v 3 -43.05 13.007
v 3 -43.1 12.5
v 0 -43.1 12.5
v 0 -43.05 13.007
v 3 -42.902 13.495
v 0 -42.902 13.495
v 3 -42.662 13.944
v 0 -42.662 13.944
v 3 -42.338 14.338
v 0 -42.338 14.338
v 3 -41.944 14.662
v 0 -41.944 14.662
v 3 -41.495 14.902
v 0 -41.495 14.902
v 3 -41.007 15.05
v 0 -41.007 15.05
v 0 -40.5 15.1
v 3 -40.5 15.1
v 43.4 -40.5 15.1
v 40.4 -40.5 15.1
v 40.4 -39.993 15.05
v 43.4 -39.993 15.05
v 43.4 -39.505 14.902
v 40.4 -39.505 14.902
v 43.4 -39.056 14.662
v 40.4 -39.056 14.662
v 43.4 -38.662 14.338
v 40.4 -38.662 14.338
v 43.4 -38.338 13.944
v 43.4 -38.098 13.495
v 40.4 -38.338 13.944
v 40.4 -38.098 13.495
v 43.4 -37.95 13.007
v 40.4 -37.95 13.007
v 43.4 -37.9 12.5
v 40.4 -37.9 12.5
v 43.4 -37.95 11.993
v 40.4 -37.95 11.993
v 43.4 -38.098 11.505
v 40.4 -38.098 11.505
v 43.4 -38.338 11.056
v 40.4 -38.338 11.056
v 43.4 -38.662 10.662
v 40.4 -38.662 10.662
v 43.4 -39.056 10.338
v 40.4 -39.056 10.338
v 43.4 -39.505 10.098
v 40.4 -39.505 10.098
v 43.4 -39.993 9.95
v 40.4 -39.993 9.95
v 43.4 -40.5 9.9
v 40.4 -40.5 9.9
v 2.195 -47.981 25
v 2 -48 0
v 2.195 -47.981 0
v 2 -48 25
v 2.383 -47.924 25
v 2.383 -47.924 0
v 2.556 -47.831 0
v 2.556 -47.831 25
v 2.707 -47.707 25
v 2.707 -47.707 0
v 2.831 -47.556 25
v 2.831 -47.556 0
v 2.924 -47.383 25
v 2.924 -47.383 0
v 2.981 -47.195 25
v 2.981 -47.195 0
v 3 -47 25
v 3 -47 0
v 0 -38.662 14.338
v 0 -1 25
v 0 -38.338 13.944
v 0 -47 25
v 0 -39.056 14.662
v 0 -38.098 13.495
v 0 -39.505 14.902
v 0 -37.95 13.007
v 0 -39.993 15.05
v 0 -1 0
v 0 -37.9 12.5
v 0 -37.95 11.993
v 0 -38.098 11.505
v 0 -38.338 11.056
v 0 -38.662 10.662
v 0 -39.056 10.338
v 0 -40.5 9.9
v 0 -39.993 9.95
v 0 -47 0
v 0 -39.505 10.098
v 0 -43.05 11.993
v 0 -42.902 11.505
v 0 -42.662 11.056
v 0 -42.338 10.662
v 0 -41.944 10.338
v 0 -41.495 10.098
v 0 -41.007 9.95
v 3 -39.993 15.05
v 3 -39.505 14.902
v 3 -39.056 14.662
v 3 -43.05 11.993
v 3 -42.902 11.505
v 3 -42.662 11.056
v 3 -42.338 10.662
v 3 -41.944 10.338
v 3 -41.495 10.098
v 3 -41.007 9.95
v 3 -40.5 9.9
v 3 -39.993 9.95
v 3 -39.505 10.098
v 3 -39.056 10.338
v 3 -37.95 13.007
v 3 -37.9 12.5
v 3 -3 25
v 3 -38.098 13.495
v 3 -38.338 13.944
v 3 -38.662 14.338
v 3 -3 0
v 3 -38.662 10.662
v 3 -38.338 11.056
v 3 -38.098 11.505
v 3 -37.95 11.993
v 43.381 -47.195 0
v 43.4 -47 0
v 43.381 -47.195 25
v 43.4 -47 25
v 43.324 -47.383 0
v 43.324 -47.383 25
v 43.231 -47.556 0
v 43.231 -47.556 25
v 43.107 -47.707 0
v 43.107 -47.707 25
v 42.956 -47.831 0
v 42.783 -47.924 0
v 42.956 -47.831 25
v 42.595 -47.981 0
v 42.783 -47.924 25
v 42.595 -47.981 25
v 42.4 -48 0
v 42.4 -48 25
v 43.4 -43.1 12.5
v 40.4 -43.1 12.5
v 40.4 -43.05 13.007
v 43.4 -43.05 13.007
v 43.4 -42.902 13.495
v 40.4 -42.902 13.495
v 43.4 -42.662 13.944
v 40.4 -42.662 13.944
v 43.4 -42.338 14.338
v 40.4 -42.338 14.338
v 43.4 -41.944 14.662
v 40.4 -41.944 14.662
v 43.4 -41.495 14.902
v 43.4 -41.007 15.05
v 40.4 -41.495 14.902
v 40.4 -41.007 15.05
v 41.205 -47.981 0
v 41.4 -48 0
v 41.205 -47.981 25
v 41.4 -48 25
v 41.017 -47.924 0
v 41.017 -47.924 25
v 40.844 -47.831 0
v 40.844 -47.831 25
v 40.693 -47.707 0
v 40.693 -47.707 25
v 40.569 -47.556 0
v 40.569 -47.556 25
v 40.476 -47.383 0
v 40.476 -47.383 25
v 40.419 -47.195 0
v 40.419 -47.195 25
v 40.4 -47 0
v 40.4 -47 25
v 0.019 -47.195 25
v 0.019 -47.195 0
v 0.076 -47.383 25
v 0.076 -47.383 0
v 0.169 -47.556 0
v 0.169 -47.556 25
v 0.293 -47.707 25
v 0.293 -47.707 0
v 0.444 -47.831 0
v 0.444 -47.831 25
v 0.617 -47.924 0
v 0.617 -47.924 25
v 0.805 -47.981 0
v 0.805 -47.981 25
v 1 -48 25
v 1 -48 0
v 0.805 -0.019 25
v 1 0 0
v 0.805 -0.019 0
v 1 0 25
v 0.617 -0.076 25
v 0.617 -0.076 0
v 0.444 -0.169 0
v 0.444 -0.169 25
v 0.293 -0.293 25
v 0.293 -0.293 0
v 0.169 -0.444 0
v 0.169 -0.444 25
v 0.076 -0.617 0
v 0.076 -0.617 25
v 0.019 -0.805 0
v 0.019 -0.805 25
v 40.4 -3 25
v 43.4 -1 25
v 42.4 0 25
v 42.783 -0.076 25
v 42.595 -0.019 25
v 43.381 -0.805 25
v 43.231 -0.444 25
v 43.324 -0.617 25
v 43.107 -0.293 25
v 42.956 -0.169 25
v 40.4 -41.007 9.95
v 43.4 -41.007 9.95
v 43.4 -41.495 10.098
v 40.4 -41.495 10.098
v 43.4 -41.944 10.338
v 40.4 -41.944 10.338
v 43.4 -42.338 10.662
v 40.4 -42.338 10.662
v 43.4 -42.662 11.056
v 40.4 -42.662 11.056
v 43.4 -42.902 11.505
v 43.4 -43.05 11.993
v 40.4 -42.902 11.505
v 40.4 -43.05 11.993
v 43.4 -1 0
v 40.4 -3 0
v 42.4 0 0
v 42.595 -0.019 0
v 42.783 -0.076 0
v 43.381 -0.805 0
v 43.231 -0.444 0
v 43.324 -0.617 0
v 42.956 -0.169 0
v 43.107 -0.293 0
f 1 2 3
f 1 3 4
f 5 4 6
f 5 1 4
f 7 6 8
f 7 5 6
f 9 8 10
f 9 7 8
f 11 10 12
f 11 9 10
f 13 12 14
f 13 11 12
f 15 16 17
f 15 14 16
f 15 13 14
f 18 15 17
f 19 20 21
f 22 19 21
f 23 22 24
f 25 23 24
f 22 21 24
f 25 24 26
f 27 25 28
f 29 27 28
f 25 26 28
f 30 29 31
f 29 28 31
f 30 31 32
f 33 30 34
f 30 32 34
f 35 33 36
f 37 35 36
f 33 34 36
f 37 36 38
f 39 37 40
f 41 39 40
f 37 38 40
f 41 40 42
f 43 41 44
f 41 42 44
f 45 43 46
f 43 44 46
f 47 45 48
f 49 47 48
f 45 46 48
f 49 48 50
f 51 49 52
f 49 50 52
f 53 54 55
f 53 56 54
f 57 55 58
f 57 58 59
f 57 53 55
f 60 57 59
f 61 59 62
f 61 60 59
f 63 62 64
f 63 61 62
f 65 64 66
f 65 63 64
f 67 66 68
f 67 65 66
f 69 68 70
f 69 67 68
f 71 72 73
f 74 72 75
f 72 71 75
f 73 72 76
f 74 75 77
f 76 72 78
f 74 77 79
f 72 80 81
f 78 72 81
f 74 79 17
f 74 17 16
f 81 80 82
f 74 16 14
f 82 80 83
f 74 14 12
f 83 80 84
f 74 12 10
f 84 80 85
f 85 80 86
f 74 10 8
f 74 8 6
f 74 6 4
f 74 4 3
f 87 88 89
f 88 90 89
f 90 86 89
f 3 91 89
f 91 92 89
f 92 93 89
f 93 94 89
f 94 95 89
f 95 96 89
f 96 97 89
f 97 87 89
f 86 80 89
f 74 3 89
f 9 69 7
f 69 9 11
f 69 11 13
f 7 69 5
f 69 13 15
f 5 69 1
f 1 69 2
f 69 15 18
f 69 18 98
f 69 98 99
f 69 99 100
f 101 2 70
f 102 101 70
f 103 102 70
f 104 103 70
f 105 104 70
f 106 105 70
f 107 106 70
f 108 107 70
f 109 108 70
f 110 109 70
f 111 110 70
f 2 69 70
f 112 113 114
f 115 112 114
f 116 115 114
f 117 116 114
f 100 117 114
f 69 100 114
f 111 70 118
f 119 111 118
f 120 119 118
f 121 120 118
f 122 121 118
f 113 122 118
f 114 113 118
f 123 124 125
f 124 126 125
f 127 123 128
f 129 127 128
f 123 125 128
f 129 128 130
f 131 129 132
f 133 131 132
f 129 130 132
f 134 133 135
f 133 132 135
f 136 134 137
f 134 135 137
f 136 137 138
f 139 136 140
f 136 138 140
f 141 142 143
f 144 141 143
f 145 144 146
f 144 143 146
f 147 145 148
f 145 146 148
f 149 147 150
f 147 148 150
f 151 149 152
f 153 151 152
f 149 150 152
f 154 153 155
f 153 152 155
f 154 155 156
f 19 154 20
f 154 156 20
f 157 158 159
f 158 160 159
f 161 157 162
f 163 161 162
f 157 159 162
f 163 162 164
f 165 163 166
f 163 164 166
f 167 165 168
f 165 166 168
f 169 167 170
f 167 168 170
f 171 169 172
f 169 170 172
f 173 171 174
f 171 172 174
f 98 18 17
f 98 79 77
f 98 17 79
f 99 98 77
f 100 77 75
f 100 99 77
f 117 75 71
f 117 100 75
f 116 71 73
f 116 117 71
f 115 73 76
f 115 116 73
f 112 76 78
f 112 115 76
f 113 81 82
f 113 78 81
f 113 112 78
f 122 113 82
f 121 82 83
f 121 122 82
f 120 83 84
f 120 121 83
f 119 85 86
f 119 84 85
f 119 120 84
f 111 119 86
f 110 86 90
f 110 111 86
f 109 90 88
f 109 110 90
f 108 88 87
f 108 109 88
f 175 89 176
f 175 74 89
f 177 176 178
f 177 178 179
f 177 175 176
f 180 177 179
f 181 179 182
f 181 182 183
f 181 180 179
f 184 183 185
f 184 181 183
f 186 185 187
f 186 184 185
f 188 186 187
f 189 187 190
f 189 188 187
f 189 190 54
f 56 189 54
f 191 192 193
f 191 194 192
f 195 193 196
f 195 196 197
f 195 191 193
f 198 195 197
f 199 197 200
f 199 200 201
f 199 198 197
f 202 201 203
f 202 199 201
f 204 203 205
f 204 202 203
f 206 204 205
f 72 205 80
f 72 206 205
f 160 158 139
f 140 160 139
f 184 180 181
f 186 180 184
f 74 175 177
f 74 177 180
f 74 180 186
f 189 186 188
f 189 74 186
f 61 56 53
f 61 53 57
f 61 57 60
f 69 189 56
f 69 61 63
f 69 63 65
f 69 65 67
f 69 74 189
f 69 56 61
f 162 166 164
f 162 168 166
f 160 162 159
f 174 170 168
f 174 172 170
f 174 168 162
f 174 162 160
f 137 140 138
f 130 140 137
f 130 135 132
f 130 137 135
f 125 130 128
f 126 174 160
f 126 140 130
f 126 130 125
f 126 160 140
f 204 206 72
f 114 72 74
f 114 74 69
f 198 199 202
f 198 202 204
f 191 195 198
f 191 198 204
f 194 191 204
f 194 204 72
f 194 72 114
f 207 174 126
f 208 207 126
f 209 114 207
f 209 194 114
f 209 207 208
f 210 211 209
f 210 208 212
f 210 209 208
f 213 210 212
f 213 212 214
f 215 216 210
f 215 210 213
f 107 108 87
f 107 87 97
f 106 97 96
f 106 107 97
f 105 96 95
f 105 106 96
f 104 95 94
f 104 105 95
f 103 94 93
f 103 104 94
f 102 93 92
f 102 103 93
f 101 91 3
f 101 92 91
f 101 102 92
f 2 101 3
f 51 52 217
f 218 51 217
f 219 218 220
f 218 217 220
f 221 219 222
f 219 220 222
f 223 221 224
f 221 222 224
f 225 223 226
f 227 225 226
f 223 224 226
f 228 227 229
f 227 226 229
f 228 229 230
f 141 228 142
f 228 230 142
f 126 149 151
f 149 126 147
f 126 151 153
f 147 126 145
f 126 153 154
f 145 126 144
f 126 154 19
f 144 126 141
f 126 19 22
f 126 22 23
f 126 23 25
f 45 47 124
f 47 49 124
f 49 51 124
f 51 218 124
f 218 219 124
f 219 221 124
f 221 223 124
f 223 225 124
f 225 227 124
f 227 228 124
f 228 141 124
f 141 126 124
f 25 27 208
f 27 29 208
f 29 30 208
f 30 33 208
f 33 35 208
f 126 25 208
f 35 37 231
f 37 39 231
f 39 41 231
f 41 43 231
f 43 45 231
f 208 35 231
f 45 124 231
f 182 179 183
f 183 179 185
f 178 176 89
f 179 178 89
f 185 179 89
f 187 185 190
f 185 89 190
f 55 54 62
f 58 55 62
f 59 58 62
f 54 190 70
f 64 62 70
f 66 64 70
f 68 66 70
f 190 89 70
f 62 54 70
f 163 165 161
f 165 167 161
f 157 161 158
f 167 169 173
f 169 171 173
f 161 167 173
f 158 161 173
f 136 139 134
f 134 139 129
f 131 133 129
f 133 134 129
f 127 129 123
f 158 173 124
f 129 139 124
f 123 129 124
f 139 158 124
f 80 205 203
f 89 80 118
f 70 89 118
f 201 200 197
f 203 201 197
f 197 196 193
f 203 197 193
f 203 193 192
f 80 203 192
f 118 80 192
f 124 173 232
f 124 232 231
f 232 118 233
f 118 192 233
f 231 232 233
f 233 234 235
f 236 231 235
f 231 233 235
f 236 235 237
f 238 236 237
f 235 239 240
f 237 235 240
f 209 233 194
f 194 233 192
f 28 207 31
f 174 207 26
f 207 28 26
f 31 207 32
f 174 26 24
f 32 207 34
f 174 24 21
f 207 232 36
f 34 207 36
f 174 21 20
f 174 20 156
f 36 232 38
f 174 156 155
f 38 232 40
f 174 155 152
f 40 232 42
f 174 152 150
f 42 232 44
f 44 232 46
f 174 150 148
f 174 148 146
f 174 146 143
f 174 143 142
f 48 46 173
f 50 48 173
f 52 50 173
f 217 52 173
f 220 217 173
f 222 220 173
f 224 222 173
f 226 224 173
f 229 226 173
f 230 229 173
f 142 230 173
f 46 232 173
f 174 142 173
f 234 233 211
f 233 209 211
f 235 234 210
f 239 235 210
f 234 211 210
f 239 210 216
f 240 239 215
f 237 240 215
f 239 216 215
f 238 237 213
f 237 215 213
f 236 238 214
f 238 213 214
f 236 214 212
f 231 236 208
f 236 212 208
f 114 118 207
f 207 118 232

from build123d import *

# Parameters (mm, degrees)
F1_DEPTH      = 25
F3_DEPTH      = 40.401
F3_DEPTH_BACK = 25
F4_R          = 1
F5_R          = 1


with BuildPart() as f1:
    # F0 (on Top) → F1 (new body)
    with BuildSketch(Plane.XY):
        Polygon((43.4, 0), (0, 0), (0, -48), (3, -48), (3, -3), (40.4, -3), (40.4, -48), (43.4, -48), align=None)
    extrude(amount=F1_DEPTH)

    # F2 (on face) → F3 (cut, two sides)
    with BuildSketch(Plane(origin=(40.4, 0, 0), x_dir=(0, -1, 0), z_dir=(-1, 0, 0))) as f3_sk:
        with BuildLine():
            Line((40.5, 12.5), (40.5, 15.1))
            ThreePointArc((40.5, 15.1), (37.9, 12.5), (40.5, 9.9))
            Line((40.5, 9.9), (40.5, 12.5))
        make_face()
        with BuildLine():
            ThreePointArc((43.1, 12.5), (42.338478, 14.338478), (40.5, 15.1))
            Line((40.5, 15.1), (40.5, 12.5))
            Line((40.5, 12.5), (40.5, 9.9))
            ThreePointArc((40.5, 9.9), (42.338478, 10.661522), (43.1, 12.5))
        make_face()
    extrude(amount=F3_DEPTH, mode=Mode.SUBTRACT)
    extrude(f3_sk.sketch, amount=-F3_DEPTH_BACK, mode=Mode.SUBTRACT)

    # F4
    f4_edges = [f1.edges().sort_by_distance(p)[0] for p in [
        (0, -48, 12.5),
        (3, -48, 12.5),
        (40.4, -48, 12.5),
        (43.4, -48, 12.5),
        (0, 0, 12.5),
    ]]
    fillet(f4_edges, radius=F4_R)

    # F5
    f5_edges = [f1.edges().sort_by_distance(p)[0] for p in [
        (43.4, 0, 12.5),
    ]]
    fillet(f5_edges, radius=F5_R)


solid = f1.part
